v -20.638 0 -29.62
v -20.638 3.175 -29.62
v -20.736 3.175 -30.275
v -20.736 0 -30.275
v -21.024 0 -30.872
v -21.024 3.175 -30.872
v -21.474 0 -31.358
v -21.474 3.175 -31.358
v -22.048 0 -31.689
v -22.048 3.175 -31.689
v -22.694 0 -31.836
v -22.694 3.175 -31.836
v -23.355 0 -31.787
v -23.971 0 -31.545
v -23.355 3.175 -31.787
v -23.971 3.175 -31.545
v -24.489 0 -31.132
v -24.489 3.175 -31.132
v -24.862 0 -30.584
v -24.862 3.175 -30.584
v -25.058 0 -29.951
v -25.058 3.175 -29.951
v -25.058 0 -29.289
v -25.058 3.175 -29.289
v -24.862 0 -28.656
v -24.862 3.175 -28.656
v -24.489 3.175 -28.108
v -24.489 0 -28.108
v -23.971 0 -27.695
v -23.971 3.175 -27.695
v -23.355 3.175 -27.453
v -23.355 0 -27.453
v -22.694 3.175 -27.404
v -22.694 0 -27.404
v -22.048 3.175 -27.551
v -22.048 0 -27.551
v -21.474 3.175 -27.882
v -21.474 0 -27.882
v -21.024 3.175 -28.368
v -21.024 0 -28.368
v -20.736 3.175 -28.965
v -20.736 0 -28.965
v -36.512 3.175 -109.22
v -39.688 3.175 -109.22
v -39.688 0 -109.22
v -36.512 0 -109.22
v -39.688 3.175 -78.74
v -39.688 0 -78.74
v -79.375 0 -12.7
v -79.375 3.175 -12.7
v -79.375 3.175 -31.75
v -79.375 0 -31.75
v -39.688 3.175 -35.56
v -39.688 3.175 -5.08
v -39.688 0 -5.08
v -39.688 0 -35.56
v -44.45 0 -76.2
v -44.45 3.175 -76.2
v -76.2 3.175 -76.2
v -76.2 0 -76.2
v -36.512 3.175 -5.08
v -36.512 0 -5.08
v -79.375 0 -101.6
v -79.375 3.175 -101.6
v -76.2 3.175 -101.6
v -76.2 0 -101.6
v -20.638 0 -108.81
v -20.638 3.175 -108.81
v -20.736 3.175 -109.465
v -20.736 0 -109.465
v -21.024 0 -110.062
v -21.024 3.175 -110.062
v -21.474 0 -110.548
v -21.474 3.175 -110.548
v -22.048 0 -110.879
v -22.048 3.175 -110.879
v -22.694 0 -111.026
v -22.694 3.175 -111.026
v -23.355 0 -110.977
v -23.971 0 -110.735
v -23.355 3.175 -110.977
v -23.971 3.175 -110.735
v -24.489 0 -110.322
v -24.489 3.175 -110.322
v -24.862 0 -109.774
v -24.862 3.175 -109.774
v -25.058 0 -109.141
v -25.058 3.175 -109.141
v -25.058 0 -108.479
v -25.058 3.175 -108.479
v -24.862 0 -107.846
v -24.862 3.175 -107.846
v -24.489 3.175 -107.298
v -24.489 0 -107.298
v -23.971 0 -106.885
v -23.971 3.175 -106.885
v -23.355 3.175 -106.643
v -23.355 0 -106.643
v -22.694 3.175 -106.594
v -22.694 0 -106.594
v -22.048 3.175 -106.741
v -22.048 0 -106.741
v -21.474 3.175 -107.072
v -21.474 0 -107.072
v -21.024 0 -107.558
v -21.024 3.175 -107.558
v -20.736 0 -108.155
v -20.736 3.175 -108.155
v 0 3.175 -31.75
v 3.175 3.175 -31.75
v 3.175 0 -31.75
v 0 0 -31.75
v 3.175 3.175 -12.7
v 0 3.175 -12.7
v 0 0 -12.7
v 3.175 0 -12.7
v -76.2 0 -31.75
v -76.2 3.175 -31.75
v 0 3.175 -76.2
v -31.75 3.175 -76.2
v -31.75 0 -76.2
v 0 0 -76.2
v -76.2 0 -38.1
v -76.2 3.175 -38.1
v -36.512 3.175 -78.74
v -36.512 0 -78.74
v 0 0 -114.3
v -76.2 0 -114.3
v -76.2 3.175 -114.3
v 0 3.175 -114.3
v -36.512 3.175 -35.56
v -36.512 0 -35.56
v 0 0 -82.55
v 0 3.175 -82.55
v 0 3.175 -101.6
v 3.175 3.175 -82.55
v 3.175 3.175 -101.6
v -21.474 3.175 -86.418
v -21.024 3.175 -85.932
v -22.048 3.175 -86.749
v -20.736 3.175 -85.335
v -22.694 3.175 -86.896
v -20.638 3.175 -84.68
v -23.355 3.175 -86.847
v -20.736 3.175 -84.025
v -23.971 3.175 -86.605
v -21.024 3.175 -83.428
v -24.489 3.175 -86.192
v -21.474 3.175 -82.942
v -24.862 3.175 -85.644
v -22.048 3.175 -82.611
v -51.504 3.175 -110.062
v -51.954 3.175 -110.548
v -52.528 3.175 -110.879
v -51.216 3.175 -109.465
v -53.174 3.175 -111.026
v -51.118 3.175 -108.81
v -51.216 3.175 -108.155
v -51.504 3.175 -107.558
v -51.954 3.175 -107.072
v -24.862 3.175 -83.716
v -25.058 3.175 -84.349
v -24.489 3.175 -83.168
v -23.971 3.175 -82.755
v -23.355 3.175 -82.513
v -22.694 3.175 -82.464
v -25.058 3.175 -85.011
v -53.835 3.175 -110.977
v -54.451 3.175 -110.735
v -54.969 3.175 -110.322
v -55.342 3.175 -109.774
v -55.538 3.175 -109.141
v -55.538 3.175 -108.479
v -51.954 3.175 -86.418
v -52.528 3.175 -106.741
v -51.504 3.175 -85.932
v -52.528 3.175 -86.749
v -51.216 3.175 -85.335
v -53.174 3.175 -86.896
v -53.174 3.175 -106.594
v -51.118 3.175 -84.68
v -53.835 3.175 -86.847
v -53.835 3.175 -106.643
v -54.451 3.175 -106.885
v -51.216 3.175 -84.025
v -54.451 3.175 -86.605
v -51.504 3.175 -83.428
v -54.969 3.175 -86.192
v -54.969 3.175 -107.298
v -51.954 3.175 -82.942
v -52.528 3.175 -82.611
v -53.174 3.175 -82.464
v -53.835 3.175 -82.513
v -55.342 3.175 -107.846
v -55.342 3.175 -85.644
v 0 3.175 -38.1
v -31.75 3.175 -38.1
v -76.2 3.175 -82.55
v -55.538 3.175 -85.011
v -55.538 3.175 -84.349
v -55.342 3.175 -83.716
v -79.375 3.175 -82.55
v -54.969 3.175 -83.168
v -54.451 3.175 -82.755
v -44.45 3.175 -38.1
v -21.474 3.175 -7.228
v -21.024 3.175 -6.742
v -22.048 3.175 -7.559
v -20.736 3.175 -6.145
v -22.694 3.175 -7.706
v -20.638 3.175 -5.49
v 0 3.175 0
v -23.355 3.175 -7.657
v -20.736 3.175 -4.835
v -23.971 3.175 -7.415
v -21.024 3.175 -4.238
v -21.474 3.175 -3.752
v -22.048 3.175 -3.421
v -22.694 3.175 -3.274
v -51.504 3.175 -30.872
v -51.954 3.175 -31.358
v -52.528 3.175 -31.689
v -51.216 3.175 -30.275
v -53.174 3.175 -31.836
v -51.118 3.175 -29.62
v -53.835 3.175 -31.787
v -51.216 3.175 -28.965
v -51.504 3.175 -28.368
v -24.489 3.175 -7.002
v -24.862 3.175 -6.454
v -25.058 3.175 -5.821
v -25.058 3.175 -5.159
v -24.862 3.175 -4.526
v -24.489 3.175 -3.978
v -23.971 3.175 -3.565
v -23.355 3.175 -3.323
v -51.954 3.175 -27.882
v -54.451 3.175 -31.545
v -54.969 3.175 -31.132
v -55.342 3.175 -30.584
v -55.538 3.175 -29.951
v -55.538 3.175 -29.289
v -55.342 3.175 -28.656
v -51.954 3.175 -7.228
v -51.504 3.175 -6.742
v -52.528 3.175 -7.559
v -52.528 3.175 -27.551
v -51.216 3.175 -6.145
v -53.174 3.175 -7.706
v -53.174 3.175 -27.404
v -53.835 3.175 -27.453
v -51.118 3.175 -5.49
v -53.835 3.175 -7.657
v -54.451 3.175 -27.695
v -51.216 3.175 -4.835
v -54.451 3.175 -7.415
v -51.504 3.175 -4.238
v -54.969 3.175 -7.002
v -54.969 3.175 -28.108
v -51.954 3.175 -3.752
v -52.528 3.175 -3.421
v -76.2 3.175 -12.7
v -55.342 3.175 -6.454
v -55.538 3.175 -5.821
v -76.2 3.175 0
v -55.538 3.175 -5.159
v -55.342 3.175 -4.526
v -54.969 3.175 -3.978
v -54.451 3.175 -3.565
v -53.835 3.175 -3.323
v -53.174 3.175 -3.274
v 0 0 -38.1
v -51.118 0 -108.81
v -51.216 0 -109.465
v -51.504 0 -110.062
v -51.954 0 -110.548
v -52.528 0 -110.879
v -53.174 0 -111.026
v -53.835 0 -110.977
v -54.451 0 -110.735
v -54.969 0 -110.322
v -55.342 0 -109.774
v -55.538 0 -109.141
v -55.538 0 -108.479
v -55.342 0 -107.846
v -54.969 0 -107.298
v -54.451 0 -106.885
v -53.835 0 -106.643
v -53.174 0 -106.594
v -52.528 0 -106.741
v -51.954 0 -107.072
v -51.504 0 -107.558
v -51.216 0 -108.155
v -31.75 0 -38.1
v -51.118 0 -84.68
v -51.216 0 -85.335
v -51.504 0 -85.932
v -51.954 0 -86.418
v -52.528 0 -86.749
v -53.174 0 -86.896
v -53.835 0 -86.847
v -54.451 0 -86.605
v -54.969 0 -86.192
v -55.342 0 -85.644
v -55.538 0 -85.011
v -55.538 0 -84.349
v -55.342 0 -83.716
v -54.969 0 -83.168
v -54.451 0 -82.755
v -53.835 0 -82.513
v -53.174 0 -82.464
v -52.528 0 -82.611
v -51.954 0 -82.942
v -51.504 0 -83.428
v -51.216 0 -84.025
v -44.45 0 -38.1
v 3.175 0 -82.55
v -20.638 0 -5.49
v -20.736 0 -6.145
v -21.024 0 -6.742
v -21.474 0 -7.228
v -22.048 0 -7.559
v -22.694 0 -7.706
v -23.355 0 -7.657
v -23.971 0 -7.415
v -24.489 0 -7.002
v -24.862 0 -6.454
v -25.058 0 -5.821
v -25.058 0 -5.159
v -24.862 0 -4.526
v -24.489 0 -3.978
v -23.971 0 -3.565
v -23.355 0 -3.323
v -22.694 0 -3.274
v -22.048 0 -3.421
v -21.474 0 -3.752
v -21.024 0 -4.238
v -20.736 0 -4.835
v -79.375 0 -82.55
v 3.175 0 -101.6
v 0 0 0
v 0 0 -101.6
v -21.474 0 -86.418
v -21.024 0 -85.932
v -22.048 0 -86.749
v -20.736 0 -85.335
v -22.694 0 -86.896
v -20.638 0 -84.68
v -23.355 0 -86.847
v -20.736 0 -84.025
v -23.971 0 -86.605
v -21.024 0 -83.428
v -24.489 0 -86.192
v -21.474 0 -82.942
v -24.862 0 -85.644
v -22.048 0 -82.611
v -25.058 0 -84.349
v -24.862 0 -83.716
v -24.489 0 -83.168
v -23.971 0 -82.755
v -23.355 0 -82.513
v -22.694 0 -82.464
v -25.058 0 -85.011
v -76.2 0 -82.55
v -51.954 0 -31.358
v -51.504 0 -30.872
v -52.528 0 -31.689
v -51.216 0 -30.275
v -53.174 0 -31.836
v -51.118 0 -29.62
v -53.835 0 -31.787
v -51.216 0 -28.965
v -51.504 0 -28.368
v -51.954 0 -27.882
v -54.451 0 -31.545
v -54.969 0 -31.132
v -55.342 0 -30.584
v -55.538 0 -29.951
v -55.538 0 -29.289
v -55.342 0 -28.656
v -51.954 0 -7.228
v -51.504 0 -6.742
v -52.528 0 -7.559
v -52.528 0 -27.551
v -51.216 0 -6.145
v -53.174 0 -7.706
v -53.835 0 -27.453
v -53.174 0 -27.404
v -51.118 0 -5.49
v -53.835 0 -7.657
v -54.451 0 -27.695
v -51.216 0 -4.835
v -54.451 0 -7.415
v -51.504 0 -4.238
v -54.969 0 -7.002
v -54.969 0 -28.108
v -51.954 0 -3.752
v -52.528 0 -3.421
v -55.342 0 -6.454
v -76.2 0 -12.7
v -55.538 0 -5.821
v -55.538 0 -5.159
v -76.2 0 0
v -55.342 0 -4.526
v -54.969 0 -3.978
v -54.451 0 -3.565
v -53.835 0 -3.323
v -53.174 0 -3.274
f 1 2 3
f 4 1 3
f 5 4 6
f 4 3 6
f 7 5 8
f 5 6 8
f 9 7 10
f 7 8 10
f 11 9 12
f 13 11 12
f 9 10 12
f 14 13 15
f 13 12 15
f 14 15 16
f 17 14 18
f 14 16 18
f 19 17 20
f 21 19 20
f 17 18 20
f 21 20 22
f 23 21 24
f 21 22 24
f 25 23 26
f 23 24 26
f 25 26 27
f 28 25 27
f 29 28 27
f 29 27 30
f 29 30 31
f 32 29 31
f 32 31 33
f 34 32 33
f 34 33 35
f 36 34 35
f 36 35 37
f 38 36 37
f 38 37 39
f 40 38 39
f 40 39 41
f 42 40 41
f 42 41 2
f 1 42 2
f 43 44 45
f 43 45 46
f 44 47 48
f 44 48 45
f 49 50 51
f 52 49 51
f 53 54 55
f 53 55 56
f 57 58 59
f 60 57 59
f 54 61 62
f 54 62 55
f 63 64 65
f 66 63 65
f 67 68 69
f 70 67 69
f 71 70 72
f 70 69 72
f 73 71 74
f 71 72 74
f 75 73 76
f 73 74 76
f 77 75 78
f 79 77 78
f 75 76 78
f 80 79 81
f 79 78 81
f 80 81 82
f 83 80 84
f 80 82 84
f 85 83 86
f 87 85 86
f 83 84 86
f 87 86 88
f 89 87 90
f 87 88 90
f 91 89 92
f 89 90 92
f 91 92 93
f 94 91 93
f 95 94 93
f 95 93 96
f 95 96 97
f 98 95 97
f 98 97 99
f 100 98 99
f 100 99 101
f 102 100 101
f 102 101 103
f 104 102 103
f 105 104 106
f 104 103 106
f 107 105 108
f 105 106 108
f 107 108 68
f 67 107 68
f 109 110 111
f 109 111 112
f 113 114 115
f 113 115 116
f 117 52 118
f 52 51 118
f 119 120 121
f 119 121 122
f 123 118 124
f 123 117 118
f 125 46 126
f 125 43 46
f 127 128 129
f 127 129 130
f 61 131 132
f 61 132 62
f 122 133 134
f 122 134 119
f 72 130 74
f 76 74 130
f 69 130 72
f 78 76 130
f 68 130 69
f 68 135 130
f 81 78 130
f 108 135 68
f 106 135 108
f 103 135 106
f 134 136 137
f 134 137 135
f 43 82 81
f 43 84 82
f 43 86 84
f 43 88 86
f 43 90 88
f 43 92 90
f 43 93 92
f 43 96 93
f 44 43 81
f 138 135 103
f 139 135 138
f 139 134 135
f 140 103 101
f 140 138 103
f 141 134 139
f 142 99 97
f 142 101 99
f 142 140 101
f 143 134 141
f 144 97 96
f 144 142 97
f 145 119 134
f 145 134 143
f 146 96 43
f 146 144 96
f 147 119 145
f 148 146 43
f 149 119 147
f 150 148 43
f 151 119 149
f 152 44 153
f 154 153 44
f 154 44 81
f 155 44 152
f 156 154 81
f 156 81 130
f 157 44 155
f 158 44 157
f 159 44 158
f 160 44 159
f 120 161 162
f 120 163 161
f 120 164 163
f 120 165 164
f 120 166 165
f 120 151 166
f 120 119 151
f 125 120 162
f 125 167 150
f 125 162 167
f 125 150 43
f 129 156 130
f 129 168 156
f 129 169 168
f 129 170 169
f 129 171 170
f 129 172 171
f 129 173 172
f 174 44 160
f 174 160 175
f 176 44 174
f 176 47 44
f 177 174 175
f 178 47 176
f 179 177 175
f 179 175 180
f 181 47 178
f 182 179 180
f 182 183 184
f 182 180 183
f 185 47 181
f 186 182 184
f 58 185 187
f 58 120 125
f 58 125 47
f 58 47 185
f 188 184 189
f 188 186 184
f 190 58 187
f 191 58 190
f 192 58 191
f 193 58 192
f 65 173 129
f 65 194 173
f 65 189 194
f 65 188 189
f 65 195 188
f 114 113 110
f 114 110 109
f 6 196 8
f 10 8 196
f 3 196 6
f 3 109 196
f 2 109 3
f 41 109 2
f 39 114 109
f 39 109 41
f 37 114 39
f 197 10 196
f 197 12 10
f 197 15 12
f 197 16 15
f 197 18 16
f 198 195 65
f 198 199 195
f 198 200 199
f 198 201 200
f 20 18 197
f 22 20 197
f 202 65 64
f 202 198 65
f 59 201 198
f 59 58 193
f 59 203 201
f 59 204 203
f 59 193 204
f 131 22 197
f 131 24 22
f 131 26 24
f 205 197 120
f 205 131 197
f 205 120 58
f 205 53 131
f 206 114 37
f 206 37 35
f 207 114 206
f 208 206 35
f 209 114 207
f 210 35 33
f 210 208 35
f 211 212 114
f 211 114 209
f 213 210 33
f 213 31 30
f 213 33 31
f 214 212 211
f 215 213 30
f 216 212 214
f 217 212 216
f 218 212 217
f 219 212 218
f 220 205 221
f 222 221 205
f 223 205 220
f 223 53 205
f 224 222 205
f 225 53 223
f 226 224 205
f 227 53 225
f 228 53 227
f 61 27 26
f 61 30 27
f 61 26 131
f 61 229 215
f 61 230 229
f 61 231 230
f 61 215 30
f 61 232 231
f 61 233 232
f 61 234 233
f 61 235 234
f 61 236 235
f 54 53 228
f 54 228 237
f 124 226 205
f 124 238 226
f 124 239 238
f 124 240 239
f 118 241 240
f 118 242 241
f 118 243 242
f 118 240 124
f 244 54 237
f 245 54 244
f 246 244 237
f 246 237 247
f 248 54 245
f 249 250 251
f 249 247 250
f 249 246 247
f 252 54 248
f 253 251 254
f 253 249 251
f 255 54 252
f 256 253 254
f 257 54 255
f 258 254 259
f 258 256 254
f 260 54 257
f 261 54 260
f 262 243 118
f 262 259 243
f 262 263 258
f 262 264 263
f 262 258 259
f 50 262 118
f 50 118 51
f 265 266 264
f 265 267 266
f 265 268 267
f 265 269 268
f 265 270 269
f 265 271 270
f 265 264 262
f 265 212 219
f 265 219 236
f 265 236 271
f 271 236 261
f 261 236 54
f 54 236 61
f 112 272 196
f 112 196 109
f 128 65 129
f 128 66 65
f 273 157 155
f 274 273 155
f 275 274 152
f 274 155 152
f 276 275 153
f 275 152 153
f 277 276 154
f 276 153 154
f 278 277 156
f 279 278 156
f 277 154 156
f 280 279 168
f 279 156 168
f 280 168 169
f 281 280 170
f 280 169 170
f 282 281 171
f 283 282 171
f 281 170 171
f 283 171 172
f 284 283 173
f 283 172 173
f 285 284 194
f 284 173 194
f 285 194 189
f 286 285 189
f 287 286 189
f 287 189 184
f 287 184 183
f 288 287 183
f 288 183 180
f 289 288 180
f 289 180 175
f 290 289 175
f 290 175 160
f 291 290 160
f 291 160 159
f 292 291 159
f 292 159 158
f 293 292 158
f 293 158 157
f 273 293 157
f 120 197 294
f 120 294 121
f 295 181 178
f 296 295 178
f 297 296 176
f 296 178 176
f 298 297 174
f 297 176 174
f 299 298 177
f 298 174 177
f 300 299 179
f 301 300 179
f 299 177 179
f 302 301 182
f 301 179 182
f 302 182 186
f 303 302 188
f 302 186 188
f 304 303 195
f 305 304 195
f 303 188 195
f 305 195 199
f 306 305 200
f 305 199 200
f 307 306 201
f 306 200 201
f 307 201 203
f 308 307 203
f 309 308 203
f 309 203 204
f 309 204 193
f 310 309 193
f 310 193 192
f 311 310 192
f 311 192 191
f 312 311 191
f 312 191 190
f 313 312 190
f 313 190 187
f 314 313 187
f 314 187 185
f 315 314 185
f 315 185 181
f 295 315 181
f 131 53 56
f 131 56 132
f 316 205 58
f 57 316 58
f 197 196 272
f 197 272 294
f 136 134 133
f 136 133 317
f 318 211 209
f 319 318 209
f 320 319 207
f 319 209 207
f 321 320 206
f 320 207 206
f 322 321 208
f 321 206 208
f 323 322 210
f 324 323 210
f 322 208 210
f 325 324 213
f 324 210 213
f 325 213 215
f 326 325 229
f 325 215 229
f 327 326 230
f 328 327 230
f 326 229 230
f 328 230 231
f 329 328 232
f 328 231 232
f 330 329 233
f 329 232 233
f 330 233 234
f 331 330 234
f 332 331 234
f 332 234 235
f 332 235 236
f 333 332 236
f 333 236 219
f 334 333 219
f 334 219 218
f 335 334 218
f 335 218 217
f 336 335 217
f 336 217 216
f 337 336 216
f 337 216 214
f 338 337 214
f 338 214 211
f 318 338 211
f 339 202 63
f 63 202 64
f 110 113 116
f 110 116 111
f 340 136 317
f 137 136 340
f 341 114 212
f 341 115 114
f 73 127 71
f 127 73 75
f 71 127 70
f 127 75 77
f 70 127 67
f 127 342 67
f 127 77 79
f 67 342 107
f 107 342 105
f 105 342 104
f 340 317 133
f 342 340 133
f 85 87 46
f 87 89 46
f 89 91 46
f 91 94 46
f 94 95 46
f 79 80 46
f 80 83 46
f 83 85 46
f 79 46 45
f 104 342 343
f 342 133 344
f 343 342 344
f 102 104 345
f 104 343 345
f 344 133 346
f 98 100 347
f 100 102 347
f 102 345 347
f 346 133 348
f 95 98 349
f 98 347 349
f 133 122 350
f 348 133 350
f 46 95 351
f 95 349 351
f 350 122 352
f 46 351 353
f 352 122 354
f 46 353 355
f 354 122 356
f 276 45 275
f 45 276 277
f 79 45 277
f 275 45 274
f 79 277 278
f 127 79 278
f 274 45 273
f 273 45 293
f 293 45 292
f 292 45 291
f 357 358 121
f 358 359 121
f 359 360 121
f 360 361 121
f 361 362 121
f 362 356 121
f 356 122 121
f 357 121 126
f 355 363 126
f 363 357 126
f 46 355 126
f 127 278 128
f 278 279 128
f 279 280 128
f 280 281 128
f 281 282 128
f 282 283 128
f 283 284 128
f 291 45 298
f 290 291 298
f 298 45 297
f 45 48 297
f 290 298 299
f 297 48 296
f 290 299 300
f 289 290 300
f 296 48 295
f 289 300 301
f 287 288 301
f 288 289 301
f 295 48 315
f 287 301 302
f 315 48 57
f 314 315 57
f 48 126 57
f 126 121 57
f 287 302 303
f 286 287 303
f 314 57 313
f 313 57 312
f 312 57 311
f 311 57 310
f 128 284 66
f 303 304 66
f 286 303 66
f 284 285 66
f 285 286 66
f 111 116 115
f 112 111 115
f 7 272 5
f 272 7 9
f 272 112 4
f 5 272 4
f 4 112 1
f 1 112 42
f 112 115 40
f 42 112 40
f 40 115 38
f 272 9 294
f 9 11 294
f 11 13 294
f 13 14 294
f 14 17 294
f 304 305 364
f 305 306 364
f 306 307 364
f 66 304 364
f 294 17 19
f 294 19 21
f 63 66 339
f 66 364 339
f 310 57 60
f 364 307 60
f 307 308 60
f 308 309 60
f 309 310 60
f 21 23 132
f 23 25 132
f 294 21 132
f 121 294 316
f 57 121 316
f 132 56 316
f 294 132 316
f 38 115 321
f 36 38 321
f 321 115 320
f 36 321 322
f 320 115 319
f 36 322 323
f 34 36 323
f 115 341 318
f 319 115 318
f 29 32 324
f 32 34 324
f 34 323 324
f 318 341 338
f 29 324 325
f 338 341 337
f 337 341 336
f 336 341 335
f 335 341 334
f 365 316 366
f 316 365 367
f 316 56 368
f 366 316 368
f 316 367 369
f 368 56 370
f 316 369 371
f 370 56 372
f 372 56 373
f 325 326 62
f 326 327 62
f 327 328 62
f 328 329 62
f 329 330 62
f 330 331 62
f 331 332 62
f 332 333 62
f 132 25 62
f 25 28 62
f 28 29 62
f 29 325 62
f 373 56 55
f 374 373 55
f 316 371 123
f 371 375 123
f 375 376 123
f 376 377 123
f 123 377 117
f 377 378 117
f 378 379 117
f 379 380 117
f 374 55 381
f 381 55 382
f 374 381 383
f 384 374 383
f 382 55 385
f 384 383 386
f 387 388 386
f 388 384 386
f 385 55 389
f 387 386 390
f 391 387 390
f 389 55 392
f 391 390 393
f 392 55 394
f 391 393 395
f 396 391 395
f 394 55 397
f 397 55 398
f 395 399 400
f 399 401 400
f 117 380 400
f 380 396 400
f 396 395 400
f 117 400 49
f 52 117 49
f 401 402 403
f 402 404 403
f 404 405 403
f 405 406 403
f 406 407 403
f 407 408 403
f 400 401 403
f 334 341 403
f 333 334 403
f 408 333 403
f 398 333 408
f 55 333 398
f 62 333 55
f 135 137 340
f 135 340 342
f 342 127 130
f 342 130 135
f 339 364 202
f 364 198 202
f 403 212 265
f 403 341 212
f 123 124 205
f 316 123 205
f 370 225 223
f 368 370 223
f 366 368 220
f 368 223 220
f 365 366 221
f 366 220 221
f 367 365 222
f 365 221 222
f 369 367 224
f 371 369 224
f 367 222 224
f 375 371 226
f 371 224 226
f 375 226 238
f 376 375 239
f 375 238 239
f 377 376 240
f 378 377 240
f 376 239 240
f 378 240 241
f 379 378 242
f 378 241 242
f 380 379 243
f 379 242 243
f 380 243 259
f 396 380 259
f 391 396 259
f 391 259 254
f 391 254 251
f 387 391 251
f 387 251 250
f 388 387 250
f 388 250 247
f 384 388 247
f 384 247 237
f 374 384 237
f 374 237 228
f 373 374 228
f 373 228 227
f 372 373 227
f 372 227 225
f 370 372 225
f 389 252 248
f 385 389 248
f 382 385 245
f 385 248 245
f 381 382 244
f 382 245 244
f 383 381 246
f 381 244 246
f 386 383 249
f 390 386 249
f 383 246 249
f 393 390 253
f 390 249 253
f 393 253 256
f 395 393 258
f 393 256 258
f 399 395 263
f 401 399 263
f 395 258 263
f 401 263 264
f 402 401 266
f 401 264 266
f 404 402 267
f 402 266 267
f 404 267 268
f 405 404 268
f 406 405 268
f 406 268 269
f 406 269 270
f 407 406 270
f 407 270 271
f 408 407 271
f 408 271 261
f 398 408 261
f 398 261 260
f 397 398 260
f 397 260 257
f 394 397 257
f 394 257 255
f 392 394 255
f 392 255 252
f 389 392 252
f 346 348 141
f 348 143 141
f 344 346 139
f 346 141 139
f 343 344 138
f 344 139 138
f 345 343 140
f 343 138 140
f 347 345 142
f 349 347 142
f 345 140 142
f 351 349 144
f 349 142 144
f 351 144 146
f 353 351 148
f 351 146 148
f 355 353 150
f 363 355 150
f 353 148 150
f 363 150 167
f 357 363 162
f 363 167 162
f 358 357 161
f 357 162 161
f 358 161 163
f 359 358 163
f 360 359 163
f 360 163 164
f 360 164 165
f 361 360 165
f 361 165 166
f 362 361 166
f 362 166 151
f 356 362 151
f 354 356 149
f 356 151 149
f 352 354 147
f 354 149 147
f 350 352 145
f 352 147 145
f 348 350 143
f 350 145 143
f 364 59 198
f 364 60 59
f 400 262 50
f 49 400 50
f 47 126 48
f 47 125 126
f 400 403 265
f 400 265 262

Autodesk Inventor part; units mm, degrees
ref_plane "YZ Plane" through (0, 0, 0) normal (1, 0, 0) x (0, 1, 0)
ref_plane "XZ Plane" through (0, 0, 0) normal (0, 1, 0) x (-1, 0, 0)
ref_plane "XY Plane" through (0, 0, 0) normal (0, 0, 1) x (1, 0, 0)
sketch "Sketch1" plane through (0, 0, 0) normal (0, 1, 0) x (-1, 0, 0)
  line L0 (0, 0) -> (76.2, 0)
  line L1 (76.2, 0) -> (76.2, -114.3)
  line L2 (76.2, -114.3) -> (0, -114.3)
  line L3 (0, -114.3) -> (0, 0)
  dimension "d0" = 76.2
  dimension "d1" = 114.3
extrude "Extrusion1" add sketch "Sketch1" along normal blind 3.175
sketch "Sketch2" plane through (0, 3.175, 0) normal (0, 1, 0) x (1, 0, 0)
  line L0 (0, 12.7) -> (3.175, 12.7)
  line L1 (3.175, 12.7) -> (3.175, 31.75)
  line L2 (3.175, 31.75) -> (0, 31.75)
  line L3 (0, 31.75) -> (0, 12.7)
  line L4 (0, 0) -> (0, 114.3) projected
  line L5 (0, 82.55) -> (3.175, 82.55)
  line L6 (3.175, 82.55) -> (3.175, 101.6)
  line L7 (3.175, 101.6) -> (0, 101.6)
  line L8 (0, 101.6) -> (0, 82.55)
  line L9 (-76.2, 0) -> (0, 0) projected
  line L10 (0, 114.3) -> (-76.2, 114.3) projected
  line L11 (-38.1, 0) -> (-38.1, 114.3)
  line L12 (-76.2, 12.7) -> (-79.375, 12.7)
  line L13 (-79.375, 12.7) -> (-79.375, 31.75)
  line L14 (-79.375, 31.75) -> (-76.2, 31.75)
  line L15 (-76.2, 31.75) -> (-76.2, 12.7)
  line L16 (-76.2, 0) -> (-76.2, 114.3)
  line L17 (-76.2, 82.55) -> (-79.375, 82.55)
  line L18 (-79.375, 82.55) -> (-79.375, 101.6)
  line L19 (-79.375, 101.6) -> (-76.2, 101.6)
  line L20 (-76.2, 101.6) -> (-76.2, 82.55)
  dimension "d4" = 19.05
  dimension "d5" = 19.05
  dimension "d6" = 12.7
  dimension "d7" = 12.7
  dimension "d8" = 3.175
  dimension "d9" = 3.175
  dimension "d10" = 0
extrude "Extrusion2" add sketch "Sketch2" against normal blind 3.175 contours L3 L2 L1 L0 | L4 L7 L6 L5 | L12 L13 L14 L15 | L16 L17 L18 L19
sketch "Sketch3" plane through (0, 3.175, 0) normal (0, 1, 0) x (1, 0, 0)
  line L0 (0, 82.55) -> (0, 31.75) projected
  line L1 (0, 38.1) -> (-31.75, 38.1)
  line L2 (-31.75, 38.1) -> (-31.75, 76.2)
  line L3 (-31.75, 76.2) -> (0, 76.2)
  line L4 (0, 76.2) -> (0, 38.1)
  line L5 (0, 82.55) -> (3.175, 82.55) projected
  line L6 (3.175, 31.75) -> (0, 31.75) projected
  line L7 (-76.2, 0) -> (0, 0) projected
  line L8 (-38.1, 0) -> (-38.1, 114.3) construction
  line L9 (0, 114.3) -> (-76.2, 114.3) projected
  line L10 (-76.2, 82.55) -> (-76.2, 31.75)
  line L11 (-76.2, 38.1) -> (-44.45, 38.1)
  line L12 (-44.45, 38.1) -> (-44.45, 76.2)
  line L13 (-44.45, 76.2) -> (-76.2, 76.2)
  line L14 (-76.2, 76.2) -> (-76.2, 38.1)
  line L15 (-76.2, 82.55) -> (-79.375, 82.55)
  line L16 (-79.375, 31.75) -> (-76.2, 31.75)
  dimension "d13" = 6.35
  dimension "d14" = 6.35
  dimension "d15" = 31.75
extrude "Extrusion3" cut sketch "Sketch3" against normal blind 3.175
sketch "Sketch4" plane through (0, 3.175, 0) normal (0, 1, 0) x (1, 0, 0)
  circle A0 centre (-22.86, 84.68) radius 2.2225
  circle A1 centre (-22.86, 108.81) radius 2.2225
  circle A2 centre (-53.34, 108.81) radius 2.2225
  line L0 (-31.75, 57.15) -> (-44.45, 57.15) construction
  line L1 (0, 101.6) -> (0, 114.3) projected
  circle A3 centre (-53.34, 84.68) radius 2.2225
  circle A4 centre (-22.86, 29.62) radius 2.2225
  circle A5 centre (-22.86, 5.49) radius 2.2225
  circle A6 centre (-53.34, 5.49) radius 2.2225
  circle A7 centre (-53.34, 29.62) radius 2.2225
  point P0 (0, 0)
  dimension "d24" = 4.445
  dimension "d25" = 4.445
  dimension "d26" = 4.445
  dimension "d30" = 24.13
  dimension "d33" = 30.48
  dimension "d36" = 30.48
  dimension "d37" = 22.86
  dimension "d38" = 4.445
extrude "Extrusion4" cut sketch "Sketch4" against normal blind 3.175
sketch "Sketch5" plane through (0, 3.175, 0) normal (0, 1, 0) x (1, 0, 0)
  line L0 (-36.5125, 5.08) -> (-39.6875, 5.08)
  line L1 (-39.6875, 5.08) -> (-39.6875, 35.56)
  line L2 (-39.6875, 35.56) -> (-36.5125, 35.56)
  line L3 (-36.5125, 35.56) -> (-36.5125, 5.08)
  line L4 (-36.5125, 78.74) -> (-39.6875, 78.74)
  line L5 (-39.6875, 78.74) -> (-39.6875, 109.22)
  line L6 (-39.6875, 109.22) -> (-36.5125, 109.22)
  line L7 (-36.5125, 109.22) -> (-36.5125, 78.74)
  line L8 (-76.2, 0) -> (0, 0) projected
  line L9 (0, 114.3) -> (-76.2, 114.3) projected
  line L10 (0, 101.6) -> (0, 114.3) projected
  dimension "d39" = 3.175
  dimension "d40" = 5.08
  dimension "d41" = 5.08
  dimension "d42" = 30.48
  dimension "d43" = 30.48
  dimension "d44" = 36.5125
extrude "Extrusion5" cut sketch "Sketch5" against normal blind 3.175
properties part number "base"
